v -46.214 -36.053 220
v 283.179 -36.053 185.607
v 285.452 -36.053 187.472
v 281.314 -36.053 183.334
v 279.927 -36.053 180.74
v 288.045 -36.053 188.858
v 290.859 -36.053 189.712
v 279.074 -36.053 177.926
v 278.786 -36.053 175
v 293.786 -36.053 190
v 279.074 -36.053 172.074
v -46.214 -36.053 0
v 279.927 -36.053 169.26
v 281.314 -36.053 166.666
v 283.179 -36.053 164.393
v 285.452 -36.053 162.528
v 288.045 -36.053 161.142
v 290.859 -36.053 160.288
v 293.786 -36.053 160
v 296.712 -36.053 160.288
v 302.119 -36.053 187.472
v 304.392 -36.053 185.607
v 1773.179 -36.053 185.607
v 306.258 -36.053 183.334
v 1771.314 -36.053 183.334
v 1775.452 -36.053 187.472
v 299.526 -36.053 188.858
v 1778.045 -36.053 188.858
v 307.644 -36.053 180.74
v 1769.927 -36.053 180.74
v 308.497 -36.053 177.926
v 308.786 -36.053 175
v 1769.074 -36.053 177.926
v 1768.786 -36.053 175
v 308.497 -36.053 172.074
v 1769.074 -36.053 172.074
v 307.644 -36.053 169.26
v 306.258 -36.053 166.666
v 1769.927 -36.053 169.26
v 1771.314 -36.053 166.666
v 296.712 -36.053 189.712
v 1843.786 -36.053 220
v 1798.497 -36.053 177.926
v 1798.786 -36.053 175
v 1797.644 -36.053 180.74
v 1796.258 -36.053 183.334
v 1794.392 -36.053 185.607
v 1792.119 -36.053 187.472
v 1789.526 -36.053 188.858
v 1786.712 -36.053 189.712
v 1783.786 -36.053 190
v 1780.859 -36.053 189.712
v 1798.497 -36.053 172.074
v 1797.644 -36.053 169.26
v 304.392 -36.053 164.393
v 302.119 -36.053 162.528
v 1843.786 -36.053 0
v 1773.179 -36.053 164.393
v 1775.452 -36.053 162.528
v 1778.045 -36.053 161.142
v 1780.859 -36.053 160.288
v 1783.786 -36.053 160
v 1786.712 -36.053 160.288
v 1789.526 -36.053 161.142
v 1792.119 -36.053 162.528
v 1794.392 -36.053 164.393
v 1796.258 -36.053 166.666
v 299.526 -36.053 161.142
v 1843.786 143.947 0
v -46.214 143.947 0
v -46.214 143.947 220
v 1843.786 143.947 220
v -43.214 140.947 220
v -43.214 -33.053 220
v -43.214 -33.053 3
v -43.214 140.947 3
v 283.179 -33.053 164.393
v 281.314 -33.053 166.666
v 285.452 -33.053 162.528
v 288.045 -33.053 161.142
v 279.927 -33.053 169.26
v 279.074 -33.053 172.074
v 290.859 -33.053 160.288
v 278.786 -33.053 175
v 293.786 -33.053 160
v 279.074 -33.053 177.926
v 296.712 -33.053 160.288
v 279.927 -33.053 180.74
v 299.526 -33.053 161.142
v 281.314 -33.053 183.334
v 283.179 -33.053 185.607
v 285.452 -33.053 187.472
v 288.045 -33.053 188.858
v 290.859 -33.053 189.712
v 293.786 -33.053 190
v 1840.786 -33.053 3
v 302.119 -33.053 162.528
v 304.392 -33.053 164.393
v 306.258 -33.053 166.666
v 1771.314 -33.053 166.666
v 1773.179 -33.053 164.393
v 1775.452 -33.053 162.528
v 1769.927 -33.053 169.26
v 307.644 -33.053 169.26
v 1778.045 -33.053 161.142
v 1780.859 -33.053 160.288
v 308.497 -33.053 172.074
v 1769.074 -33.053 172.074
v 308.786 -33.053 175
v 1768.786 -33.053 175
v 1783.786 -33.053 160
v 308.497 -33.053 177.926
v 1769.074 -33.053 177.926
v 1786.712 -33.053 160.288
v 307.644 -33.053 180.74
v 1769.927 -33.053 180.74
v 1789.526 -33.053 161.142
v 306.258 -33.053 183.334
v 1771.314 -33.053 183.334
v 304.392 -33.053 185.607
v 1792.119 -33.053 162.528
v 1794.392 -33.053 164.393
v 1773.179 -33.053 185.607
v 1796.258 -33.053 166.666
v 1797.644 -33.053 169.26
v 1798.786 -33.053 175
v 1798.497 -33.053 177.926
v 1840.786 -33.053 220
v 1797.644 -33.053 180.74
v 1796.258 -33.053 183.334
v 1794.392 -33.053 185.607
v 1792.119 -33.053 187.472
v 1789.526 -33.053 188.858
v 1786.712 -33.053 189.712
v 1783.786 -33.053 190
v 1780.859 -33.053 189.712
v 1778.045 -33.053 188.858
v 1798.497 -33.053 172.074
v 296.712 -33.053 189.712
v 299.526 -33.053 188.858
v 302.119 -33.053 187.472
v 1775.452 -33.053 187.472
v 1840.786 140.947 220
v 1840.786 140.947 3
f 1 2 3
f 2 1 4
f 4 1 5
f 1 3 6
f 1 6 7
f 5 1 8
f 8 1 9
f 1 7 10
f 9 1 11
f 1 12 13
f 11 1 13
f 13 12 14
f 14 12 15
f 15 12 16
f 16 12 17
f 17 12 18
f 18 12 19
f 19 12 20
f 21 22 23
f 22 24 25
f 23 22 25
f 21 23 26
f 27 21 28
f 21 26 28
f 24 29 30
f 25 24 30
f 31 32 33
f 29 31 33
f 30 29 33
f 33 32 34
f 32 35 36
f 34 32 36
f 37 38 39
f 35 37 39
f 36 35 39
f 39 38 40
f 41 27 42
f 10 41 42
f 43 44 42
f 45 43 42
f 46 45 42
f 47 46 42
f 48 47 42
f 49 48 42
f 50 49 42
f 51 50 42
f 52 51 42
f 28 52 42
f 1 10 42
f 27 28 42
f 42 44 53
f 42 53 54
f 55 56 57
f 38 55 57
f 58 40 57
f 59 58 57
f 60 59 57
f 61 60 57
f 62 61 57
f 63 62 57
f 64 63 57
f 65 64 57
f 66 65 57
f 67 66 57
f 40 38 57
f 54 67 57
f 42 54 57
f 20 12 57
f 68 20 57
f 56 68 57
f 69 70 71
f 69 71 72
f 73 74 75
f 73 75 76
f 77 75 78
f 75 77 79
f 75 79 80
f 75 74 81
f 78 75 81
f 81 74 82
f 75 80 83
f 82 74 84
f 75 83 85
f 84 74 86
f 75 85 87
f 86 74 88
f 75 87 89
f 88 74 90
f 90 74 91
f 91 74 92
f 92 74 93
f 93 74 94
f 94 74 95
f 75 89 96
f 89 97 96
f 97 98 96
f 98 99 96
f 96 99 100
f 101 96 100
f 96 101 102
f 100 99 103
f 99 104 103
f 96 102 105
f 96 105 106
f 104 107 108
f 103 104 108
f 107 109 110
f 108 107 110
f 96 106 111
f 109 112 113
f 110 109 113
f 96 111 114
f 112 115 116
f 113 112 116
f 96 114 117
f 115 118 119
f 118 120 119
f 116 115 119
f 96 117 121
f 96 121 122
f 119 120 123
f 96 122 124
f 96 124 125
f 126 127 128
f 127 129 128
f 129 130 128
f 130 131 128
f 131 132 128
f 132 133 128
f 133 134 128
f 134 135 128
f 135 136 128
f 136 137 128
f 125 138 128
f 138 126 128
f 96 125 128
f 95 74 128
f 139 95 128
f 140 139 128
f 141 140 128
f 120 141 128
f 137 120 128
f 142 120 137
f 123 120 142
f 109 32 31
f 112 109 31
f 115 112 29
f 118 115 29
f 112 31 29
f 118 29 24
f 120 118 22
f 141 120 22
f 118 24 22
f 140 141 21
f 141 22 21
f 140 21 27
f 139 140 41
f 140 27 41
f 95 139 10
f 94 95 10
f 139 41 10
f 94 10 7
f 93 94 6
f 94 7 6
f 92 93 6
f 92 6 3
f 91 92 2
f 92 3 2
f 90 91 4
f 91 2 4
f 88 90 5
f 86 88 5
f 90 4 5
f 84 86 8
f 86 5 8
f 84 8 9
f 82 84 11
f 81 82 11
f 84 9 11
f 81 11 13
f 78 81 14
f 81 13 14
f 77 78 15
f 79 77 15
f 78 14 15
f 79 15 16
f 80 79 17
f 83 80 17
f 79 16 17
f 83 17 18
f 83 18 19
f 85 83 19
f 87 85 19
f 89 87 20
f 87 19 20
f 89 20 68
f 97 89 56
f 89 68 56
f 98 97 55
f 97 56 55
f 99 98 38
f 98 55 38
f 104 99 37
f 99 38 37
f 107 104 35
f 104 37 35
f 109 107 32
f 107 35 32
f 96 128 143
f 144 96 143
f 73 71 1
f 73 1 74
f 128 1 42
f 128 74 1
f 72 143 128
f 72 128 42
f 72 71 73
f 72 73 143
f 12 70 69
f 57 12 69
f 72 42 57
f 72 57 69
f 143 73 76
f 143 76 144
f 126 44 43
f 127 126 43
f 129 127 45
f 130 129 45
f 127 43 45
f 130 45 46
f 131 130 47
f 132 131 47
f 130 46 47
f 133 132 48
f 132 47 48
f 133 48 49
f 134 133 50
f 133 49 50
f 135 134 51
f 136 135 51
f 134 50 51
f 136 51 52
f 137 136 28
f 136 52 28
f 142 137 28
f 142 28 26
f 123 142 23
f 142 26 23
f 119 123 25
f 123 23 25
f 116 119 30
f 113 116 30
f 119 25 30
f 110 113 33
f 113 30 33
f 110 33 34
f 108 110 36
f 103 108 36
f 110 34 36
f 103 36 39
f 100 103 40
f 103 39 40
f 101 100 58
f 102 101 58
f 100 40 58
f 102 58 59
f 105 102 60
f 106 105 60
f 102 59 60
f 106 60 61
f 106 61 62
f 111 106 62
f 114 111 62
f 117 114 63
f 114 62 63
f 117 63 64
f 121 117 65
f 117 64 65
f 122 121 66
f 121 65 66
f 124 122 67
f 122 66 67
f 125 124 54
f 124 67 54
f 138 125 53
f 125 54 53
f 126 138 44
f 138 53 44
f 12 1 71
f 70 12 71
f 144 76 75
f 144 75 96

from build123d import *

# Parameters (mm, degrees)
F0_W     = 1890
F0_H     = 180
F1_DEPTH = 220
F2_W     = 1884
F2_H     = 174
F3_DEPTH = 217
F4_R     = 15
F5_DEPTH = 3


with BuildPart() as f1:
    # F0 (on Top) → F1 (new body)
    with BuildSketch(Plane.XY):
        with Locations((898.785665, 53.946961)):
            Rectangle(F0_W, F0_H)
    extrude(amount=F1_DEPTH)

    # F2 (on face) → F3 (cut)
    with BuildSketch(Plane.XY.offset(220)):
        with Locations((898.785665, 53.946961)):
            Rectangle(F2_W, F2_H)
    extrude(amount=-F3_DEPTH, mode=Mode.SUBTRACT)

    # F4 (on face) → F5 (cut, through all)
    with BuildSketch(Plane.XZ.offset(36.053039)):
        with Locations((293.785665, 175)):
            Circle(F4_R)
        with Locations((1783.785665, 175)):
            Circle(F4_R)
    extrude(amount=-F5_DEPTH, mode=Mode.SUBTRACT)


solid = f1.part
